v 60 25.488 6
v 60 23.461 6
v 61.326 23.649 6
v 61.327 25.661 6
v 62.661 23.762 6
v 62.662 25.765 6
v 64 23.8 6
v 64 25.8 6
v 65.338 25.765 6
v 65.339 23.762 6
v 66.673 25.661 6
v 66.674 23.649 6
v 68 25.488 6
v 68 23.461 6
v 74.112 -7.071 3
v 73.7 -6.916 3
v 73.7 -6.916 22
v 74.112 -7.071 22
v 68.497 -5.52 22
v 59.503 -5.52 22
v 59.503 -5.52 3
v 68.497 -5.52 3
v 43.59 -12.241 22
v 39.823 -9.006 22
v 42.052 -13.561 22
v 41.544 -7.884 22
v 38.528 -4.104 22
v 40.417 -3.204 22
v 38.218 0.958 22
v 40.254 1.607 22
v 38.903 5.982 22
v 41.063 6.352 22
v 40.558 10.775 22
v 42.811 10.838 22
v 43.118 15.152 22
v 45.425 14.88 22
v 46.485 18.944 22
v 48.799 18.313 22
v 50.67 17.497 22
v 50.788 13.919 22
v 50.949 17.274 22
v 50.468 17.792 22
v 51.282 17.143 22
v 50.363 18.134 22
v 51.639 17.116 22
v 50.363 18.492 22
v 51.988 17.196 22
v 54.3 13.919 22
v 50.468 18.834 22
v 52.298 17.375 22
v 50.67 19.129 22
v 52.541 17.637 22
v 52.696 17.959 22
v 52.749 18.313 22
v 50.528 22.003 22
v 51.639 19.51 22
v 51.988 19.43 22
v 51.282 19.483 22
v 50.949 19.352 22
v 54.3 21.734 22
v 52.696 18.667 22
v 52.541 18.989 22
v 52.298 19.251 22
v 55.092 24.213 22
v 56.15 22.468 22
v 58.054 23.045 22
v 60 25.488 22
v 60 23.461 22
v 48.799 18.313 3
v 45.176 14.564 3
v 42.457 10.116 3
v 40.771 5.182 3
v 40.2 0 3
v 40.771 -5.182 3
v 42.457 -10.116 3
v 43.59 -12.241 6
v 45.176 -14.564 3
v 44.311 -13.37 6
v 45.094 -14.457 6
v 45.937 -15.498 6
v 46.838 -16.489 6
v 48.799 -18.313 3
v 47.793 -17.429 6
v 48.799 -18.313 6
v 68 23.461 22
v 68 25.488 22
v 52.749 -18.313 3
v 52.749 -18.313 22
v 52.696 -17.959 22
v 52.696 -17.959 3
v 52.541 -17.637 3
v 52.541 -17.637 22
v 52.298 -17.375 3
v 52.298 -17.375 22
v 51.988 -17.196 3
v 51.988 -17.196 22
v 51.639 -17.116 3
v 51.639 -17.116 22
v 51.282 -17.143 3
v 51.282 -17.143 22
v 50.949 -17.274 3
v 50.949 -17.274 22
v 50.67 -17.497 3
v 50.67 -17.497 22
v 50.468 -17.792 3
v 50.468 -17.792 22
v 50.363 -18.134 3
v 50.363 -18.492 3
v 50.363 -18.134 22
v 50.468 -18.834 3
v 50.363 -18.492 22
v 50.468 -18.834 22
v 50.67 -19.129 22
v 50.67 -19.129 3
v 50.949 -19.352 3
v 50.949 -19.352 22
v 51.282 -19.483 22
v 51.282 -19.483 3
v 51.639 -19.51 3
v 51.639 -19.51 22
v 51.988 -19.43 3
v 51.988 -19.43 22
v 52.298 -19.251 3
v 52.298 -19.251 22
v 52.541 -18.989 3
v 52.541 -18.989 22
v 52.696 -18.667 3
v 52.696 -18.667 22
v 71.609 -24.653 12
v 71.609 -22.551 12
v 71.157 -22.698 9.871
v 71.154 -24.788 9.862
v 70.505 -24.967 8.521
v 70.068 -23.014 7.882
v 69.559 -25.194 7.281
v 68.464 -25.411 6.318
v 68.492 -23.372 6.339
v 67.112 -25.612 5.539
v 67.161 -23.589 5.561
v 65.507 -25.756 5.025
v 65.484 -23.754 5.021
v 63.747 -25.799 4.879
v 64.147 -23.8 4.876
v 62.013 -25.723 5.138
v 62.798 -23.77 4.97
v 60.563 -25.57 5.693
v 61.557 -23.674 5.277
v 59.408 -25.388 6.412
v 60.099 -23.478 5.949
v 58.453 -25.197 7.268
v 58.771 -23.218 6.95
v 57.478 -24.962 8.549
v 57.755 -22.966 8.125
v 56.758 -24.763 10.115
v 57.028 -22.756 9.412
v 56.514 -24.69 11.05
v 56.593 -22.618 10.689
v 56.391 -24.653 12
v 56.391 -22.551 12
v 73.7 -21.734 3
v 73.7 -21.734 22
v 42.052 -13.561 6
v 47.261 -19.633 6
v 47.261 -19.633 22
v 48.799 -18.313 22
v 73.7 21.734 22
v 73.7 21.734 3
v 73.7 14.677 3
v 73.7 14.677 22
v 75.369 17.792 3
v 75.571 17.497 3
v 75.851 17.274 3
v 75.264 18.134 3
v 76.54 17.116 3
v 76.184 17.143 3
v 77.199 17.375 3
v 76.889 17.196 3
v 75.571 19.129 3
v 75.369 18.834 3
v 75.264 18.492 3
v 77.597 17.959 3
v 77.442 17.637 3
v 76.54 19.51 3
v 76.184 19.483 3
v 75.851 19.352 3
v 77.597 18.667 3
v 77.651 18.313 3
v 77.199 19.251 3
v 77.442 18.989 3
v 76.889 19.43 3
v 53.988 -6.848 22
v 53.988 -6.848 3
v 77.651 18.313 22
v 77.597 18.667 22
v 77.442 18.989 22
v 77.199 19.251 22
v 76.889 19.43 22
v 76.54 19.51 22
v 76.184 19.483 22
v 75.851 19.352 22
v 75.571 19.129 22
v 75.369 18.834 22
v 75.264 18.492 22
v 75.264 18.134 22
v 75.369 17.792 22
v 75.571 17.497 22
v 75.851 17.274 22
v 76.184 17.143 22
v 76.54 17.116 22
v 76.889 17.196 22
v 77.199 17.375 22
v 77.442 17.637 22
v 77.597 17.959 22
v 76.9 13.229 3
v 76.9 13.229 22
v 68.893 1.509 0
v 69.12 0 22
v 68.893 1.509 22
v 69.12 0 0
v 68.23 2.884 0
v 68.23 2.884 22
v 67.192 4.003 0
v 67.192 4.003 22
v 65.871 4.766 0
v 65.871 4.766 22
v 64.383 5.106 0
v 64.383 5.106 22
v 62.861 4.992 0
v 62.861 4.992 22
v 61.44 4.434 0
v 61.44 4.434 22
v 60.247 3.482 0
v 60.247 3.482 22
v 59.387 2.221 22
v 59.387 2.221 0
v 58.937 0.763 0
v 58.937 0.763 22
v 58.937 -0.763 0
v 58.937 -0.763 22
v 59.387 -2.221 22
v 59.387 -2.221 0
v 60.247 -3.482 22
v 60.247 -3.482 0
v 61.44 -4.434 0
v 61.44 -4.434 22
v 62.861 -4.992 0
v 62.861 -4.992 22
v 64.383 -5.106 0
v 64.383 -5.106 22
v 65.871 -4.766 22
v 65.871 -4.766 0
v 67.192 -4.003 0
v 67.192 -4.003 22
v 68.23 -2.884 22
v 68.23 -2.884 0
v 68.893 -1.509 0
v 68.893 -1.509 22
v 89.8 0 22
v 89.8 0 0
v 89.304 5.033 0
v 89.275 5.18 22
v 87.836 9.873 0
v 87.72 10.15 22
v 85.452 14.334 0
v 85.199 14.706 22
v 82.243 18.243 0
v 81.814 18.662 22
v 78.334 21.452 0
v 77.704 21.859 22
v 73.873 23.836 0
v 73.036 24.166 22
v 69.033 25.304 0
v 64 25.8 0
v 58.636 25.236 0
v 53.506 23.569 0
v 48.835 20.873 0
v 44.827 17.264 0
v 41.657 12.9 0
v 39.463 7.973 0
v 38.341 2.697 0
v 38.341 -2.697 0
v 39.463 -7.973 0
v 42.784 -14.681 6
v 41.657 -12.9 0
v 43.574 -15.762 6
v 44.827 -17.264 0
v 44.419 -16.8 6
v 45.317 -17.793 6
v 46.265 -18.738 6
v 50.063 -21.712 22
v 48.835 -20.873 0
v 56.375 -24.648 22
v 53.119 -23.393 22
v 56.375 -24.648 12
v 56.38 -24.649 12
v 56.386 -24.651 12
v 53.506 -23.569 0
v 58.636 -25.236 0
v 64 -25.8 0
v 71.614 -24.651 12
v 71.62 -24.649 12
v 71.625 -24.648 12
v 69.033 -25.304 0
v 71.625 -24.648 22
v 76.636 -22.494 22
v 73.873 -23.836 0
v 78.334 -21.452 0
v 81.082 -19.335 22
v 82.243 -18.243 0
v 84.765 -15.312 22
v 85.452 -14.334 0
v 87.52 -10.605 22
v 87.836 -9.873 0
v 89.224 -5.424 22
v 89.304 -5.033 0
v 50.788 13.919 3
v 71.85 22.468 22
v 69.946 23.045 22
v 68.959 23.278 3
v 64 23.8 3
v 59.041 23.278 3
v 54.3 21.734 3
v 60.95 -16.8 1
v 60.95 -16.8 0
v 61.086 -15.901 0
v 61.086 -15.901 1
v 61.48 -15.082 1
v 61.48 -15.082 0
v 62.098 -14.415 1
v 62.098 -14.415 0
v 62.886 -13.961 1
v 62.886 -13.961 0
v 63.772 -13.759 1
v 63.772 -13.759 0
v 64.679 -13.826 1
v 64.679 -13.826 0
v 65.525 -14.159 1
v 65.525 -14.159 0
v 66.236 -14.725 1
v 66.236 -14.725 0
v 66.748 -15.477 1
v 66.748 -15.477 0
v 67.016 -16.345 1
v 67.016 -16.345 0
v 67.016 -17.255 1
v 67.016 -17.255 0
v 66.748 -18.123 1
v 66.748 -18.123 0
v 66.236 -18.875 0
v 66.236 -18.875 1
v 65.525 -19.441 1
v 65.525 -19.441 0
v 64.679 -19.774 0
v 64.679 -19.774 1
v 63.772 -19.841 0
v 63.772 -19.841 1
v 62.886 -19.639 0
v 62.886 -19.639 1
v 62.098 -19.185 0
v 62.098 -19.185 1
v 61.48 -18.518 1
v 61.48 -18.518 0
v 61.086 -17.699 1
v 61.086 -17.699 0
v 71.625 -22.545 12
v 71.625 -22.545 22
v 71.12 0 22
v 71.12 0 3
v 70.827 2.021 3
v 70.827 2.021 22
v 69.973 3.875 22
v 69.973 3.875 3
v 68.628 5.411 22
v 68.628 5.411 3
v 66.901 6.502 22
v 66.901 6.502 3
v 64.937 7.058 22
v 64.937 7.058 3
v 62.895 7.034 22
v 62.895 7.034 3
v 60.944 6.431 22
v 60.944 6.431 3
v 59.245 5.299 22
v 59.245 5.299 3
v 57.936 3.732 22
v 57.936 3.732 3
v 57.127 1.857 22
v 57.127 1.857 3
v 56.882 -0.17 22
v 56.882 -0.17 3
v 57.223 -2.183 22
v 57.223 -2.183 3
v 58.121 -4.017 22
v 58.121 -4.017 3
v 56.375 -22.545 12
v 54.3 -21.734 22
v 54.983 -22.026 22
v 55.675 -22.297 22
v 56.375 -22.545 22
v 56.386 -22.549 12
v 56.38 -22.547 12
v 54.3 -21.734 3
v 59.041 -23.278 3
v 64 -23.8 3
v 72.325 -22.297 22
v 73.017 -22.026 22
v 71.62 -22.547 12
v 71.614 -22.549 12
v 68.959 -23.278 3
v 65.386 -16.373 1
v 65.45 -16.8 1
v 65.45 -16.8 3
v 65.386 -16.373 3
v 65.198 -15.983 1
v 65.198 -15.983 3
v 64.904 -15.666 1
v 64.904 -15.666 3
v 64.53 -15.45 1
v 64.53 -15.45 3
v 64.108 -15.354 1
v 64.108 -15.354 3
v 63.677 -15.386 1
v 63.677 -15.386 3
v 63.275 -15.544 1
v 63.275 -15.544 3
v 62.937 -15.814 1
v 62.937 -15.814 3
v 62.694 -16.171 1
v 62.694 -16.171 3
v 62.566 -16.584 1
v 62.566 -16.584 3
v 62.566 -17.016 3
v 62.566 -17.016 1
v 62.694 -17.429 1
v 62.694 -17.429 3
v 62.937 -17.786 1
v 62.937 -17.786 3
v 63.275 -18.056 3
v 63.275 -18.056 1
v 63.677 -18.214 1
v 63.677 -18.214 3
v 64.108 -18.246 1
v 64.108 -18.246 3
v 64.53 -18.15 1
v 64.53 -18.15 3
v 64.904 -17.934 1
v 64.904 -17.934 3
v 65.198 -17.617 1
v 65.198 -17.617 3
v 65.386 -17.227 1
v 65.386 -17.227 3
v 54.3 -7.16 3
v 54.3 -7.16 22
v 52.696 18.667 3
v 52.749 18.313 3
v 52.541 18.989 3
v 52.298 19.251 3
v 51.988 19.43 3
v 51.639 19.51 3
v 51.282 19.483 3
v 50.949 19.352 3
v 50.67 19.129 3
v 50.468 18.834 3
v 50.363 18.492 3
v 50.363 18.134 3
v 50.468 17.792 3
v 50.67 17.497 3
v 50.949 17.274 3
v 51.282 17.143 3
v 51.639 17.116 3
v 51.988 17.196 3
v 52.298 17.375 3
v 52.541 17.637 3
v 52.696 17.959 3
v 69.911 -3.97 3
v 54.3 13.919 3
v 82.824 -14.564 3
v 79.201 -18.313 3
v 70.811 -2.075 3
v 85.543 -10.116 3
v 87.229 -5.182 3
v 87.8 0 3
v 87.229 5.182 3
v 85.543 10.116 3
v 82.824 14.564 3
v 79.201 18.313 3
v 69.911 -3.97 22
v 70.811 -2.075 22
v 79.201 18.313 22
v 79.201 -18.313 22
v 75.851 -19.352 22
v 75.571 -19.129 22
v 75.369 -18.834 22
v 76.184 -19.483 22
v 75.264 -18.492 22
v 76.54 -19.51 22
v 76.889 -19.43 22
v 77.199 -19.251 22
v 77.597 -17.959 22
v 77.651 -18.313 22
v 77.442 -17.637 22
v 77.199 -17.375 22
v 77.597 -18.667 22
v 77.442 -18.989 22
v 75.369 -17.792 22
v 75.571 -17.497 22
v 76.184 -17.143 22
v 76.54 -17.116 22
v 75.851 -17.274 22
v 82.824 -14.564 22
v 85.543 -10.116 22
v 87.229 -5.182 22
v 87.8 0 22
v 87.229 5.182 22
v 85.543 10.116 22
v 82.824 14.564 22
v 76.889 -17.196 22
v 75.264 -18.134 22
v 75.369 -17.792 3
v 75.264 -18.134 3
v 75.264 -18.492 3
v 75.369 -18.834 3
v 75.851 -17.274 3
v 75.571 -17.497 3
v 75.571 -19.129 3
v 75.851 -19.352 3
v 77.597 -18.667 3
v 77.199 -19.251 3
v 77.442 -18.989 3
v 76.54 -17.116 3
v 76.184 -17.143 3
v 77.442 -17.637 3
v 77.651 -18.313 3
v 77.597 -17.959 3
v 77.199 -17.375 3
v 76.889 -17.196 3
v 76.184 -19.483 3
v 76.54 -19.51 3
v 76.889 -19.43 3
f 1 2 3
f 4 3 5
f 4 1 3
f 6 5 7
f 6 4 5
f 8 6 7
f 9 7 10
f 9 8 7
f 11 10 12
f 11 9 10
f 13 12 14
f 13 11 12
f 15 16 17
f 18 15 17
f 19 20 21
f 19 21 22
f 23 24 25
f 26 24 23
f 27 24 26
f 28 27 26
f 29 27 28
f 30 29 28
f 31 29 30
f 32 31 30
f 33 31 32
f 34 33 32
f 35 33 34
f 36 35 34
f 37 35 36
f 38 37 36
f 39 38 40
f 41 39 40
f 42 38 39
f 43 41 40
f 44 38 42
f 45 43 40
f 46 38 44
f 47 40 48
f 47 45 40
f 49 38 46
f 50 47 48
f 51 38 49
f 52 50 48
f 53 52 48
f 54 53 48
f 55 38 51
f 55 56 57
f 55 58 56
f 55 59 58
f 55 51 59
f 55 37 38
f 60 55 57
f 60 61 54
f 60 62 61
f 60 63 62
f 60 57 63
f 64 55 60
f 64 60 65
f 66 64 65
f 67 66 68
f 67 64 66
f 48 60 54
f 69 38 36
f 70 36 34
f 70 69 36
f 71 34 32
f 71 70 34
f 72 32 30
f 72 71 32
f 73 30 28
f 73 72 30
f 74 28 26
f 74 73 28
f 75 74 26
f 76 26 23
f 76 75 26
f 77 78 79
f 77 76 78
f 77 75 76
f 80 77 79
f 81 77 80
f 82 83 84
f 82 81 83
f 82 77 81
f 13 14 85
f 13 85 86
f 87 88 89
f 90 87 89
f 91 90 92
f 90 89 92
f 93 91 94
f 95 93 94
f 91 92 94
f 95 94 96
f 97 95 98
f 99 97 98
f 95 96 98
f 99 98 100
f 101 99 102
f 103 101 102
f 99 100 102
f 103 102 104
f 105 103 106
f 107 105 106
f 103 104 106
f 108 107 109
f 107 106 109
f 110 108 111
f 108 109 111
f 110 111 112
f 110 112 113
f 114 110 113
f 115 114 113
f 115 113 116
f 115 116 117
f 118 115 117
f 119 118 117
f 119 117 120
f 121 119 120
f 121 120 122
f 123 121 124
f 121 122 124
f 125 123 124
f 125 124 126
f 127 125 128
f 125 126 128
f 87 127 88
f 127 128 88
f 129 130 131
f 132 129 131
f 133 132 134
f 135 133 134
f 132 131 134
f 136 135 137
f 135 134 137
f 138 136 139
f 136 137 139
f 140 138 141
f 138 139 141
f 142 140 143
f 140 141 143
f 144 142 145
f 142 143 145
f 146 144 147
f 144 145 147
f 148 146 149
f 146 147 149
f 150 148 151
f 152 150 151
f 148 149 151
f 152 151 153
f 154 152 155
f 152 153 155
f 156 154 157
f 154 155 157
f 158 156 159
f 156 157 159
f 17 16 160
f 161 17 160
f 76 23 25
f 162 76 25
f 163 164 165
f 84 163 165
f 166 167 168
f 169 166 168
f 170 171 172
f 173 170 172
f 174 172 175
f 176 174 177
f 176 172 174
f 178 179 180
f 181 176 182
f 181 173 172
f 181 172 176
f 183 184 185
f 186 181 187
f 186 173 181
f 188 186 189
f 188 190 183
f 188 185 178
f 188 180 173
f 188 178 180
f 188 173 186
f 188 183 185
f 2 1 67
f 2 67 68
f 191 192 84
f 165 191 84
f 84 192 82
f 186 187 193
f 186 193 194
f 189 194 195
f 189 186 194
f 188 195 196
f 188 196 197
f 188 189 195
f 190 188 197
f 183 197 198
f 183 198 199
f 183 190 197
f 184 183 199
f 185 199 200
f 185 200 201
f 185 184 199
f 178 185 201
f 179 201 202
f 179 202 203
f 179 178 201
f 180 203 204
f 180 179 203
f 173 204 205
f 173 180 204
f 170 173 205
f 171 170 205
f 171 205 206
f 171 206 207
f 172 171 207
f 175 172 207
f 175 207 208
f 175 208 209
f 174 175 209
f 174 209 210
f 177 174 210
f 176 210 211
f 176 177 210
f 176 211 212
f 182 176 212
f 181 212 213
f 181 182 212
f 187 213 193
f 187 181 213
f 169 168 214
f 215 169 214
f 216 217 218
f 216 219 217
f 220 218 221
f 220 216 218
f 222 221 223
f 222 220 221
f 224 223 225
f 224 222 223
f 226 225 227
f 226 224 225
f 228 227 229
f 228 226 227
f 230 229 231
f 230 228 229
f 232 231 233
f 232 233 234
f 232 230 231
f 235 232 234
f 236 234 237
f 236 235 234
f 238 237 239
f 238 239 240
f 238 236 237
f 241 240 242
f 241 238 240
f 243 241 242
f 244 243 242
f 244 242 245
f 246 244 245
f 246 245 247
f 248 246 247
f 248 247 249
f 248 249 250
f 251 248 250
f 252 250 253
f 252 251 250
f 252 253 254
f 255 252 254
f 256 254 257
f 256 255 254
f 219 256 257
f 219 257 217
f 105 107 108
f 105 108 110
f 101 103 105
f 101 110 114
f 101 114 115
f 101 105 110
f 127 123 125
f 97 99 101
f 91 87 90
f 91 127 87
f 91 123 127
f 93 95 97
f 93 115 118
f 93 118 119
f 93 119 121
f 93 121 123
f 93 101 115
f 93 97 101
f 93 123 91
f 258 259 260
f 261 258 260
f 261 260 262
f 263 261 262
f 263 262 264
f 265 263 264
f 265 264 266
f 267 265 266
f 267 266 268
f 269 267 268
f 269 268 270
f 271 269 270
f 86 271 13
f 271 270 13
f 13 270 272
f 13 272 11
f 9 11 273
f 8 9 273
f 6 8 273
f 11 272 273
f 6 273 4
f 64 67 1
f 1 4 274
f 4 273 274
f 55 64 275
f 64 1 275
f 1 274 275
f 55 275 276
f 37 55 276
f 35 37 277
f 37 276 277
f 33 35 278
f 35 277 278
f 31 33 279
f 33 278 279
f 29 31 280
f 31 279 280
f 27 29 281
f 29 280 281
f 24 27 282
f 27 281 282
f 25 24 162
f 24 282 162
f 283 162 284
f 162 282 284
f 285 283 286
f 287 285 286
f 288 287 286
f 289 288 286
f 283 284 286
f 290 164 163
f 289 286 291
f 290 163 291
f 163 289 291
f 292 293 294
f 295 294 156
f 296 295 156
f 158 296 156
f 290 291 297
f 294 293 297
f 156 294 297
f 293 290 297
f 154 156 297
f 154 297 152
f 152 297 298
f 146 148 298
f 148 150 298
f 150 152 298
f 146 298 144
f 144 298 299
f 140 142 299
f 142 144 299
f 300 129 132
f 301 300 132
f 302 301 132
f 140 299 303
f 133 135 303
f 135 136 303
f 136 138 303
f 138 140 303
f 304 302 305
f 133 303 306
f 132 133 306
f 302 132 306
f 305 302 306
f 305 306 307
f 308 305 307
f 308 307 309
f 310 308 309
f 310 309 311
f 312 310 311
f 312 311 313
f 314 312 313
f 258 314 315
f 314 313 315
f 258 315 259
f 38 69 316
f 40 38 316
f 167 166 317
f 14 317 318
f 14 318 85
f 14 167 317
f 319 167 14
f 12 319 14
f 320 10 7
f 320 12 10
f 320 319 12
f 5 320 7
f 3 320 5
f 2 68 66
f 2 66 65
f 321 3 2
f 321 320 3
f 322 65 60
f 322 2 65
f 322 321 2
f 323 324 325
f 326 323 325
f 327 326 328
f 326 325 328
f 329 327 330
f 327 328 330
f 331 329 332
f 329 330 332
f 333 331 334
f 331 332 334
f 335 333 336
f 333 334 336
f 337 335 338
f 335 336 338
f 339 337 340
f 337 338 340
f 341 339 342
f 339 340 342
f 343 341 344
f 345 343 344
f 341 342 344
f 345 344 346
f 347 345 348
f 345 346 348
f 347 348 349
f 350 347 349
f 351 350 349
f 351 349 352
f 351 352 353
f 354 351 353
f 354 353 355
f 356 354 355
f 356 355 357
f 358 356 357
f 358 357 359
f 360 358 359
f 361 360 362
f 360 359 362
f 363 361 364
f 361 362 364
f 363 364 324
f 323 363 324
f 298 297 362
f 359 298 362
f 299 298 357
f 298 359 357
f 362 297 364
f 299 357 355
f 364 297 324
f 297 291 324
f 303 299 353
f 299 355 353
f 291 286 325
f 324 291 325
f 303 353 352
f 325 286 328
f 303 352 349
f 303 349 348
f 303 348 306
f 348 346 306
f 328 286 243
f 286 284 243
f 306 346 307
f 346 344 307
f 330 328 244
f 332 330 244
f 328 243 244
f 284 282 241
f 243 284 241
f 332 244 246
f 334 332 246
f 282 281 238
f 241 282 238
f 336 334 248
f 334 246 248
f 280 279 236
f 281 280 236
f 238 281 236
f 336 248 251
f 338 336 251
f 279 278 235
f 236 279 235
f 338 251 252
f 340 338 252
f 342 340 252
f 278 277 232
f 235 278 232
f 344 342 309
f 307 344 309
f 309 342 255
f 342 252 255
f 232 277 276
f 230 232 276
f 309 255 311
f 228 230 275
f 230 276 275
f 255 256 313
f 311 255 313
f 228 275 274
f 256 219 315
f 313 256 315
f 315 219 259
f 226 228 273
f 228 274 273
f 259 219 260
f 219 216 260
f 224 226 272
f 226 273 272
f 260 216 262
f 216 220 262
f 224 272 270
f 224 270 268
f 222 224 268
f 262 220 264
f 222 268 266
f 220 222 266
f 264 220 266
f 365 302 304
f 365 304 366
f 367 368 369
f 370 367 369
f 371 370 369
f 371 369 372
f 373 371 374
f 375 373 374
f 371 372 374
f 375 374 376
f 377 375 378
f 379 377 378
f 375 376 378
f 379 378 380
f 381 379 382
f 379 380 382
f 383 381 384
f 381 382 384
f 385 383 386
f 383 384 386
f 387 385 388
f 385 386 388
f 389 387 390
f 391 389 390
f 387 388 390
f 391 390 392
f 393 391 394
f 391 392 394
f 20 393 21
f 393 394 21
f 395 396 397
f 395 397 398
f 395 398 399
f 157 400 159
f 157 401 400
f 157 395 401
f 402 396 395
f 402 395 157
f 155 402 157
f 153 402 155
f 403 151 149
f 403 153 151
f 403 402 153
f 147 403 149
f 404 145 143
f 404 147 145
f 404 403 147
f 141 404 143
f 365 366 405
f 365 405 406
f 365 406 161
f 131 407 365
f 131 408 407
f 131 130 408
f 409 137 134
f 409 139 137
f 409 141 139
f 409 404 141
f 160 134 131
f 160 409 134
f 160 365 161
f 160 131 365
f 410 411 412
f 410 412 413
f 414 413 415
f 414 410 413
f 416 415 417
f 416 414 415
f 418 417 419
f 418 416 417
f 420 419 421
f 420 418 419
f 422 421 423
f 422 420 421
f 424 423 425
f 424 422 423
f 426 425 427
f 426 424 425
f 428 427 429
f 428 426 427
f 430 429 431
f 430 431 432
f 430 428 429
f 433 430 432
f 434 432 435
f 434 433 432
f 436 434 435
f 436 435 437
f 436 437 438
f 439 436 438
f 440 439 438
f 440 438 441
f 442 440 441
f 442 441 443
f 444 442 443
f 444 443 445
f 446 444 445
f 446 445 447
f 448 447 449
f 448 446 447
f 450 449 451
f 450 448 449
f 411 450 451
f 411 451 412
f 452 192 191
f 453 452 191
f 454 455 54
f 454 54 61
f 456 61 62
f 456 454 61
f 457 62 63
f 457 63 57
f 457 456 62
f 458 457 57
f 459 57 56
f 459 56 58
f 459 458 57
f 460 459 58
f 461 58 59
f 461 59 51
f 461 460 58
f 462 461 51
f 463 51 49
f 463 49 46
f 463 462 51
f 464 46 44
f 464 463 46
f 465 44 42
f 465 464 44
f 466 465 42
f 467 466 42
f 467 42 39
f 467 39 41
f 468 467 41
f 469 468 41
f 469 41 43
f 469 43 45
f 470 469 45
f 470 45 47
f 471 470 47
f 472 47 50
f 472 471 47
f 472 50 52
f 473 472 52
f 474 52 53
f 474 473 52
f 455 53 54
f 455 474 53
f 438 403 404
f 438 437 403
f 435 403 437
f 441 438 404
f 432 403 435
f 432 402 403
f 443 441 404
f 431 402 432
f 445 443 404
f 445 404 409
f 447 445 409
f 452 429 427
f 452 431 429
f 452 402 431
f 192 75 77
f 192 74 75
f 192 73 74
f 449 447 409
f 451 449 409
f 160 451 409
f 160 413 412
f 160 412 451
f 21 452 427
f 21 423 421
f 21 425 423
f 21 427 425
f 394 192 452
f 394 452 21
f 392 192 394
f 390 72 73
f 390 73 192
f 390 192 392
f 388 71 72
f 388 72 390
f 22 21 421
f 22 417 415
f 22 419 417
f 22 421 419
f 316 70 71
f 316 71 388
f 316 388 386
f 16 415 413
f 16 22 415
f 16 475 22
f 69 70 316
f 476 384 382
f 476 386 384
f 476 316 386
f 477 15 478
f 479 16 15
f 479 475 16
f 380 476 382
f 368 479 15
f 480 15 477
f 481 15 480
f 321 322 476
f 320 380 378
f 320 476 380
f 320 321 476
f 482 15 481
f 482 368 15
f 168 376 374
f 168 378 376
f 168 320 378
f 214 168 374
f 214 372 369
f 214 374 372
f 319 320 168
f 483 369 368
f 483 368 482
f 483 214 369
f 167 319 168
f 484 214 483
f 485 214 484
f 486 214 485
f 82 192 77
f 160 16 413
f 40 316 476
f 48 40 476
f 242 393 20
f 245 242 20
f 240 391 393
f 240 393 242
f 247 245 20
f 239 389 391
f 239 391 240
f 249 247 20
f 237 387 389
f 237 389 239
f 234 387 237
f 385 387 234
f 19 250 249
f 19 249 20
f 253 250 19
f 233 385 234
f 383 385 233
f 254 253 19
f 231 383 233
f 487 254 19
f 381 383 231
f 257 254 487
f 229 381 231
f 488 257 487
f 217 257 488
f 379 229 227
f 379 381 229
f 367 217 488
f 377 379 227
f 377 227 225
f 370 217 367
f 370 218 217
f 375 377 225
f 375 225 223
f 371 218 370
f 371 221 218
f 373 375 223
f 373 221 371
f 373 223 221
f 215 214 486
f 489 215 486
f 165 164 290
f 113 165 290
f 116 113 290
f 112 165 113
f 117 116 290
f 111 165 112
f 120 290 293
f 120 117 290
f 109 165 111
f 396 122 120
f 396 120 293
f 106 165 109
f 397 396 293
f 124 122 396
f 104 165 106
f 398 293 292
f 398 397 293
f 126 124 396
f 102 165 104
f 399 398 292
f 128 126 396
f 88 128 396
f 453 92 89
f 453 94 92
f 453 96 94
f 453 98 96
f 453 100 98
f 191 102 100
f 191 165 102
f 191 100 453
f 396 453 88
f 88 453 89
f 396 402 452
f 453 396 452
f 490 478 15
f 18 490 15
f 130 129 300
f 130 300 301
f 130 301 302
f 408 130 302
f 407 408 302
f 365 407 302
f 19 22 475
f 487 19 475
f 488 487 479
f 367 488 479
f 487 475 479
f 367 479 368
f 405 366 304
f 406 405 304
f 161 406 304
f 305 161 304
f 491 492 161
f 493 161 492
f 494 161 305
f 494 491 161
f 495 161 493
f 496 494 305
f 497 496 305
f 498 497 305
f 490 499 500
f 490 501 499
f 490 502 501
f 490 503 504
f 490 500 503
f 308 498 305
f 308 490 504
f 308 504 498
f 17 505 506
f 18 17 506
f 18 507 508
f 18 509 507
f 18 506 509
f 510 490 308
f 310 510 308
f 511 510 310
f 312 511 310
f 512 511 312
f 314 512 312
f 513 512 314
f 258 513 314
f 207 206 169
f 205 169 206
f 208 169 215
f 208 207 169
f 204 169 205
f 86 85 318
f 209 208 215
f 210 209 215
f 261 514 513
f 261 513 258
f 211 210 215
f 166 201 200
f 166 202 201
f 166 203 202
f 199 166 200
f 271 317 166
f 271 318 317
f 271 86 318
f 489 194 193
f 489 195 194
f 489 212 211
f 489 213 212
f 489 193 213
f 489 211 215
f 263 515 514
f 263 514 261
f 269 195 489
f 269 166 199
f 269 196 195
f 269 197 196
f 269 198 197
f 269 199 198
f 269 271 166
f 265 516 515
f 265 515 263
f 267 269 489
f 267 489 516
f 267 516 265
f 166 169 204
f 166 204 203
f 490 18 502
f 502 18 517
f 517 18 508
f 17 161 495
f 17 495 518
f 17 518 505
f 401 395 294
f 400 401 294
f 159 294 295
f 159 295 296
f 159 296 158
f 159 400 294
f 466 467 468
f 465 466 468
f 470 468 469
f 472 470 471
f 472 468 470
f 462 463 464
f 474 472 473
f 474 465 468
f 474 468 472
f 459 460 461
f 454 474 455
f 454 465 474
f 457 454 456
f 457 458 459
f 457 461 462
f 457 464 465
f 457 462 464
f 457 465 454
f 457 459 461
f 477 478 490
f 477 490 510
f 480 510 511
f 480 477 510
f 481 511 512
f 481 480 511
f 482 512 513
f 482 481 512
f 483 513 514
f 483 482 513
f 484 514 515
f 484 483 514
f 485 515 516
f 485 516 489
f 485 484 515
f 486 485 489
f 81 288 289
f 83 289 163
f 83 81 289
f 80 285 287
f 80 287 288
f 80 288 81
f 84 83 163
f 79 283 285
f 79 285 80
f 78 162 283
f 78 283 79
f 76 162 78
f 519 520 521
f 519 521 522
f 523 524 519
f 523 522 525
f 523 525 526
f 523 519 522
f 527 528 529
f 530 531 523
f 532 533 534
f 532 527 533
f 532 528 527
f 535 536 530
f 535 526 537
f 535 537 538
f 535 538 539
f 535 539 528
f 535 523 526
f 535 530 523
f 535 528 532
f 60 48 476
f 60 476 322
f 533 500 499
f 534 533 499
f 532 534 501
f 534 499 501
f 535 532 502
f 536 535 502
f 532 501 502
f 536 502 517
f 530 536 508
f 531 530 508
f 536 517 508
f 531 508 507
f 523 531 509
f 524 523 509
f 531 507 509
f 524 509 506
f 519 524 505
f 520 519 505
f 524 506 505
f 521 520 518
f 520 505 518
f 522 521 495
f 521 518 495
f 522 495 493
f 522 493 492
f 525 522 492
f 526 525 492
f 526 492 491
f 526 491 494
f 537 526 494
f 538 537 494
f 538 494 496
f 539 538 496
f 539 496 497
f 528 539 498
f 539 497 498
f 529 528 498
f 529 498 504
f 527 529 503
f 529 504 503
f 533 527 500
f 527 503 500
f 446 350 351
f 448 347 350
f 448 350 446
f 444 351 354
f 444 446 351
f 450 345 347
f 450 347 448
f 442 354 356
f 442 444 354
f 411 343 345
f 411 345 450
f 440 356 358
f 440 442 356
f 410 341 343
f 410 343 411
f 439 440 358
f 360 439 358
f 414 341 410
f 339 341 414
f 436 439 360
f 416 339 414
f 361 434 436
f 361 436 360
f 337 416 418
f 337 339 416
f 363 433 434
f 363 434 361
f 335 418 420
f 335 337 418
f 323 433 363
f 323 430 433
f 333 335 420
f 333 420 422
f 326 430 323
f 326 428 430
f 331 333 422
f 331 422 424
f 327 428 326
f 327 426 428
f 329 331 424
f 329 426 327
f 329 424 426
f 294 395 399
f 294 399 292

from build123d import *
from OCP.BRepFilletAPI import BRepFilletAPI_MakeChamfer

# Parameters (mm, degrees)
SKETCH_1_R               = 5
EXTRUDE_1_DEPTH          = 2
EXTRUDE_2_DEPTH          = 20
EXTRUDE_2_DEPTH_BACK     = 2
SKETCH_2_R               = 25.8
SKETCH_2_R_2             = 23.8
SKETCH_3_R               = 1.45
CUT_EXTRUDE_2_DEPTH      = 2
SKETCH_4_R               = 23.8
SKETCH_4_R_2             = 1.45
EXTRUDE_3_DEPTH          = 1
SKETCH_5_R               = 3.05
SKETCH_5_R_2             = 1.45
CUT_EXTRUDE_3_DEPTH      = 1
CUT_EXTRUDE_5_REACH      = 62.647
CUT_EXTRUDE_5_END_RADIUS = 25.8
SKETCH_6_R               = 7.625
CUT_EXTRUDE_START        = -16
CUT_EXTRUDE_6_DEPTH      = 16
EXTRUDE_5_DEPTH          = 19
CHAMFER_1_SIZE           = 1
CHAMFER_1_SIZE2          = 0.755634891
SKETCH_9_R               = 5.12
EXTRUDE_6_DEPTH          = 19
EXTRUDE_START            = -19
SKETCH_11_R              = 1.2
EXTRUDE_7_DEPTH          = 19
CHAMFER_3_SIZE           = 7.761762605
CHAMFER_3_SIZE_2         = 10
SKETCH_13_R              = 1.2
CUT_EXTRUDE_7_DEPTH      = 19
CUT_EXTRUDE_START_2      = -10
CUT_EXTRUDE_8_DEPTH      = 10
SKETCH_15_R              = 5.12
CUT_EXTRUDE_9_DEPTH      = 10


with BuildPart() as part:
    # 草图1 → 凸台-拉伸1 (new body)
    with BuildSketch(Plane.XY):
        with BuildLine():
            ThreePointArc((64, 25.8), (38.2, 0), (64, -25.8))
            ThreePointArc((64, -25.8), (82.243354955, -18.243354955), (89.8, 0))
            ThreePointArc((89.8, 0), (82.243354955, 18.243354955), (64, 25.8))
        make_face()
        with Locations((64, 0)):
            Circle(SKETCH_1_R, mode=Mode.SUBTRACT)
    extrude(amount=EXTRUDE_1_DEPTH)

    # 草图2 → 凸台-拉伸2 (add, two sides: drawn at the far end of the back side and taken through both)
    with BuildSketch(Plane.XY.offset(2).offset(-EXTRUDE_2_DEPTH_BACK)):
        with Locations((64, 0)):
            Circle(SKETCH_2_R)
        with Locations((64, 0)):
            Circle(SKETCH_2_R_2, mode=Mode.SUBTRACT)
    extrude(amount=EXTRUDE_2_DEPTH + EXTRUDE_2_DEPTH_BACK)

    # 草图3 → 切除-拉伸2 (cut)
    with BuildSketch(Plane.XY.offset(2)):
        with Locations((64, -16.8)):
            Circle(SKETCH_3_R)
    extrude(amount=-CUT_EXTRUDE_2_DEPTH, mode=Mode.SUBTRACT)

    # 草图4 → 凸台-拉伸3 (add)
    with BuildSketch(Plane.XY.offset(2)):
        with Locations((64, 0)):
            Circle(SKETCH_4_R)
        with Locations((64, -16.8)):
            Circle(SKETCH_4_R_2, mode=Mode.SUBTRACT)
    extrude(amount=EXTRUDE_3_DEPTH)

    # 草图5 → 切除-拉伸3 (cut)
    with BuildSketch(Plane(origin=(0, 0, 0), x_dir=(-1, 0, 0), z_dir=(0, 0, -1))):
        with Locations((-64, -16.8)):
            Circle(SKETCH_5_R)
        with Locations(Location((-64, -16.8, 0), (0, 0, 180))):
            Circle(SKETCH_5_R_2, mode=Mode.SUBTRACT)
    extrude(amount=-CUT_EXTRUDE_3_DEPTH, mode=Mode.SUBTRACT)

    # 切除-拉伸5: up to this cylinder (the profile starts inside it)
    cut_extrude_5_end = Plane(origin=(64, 0, 12.5), z_dir=(0, 0, -1)) * Cylinder(CUT_EXTRUDE_5_END_RADIUS, 177.894, mode=Mode.PRIVATE)
    # 草图6 → 切除-拉伸5 (cut, up to the surface)
    with BuildSketch(Plane(origin=(74.5, -5.45, -15.2), x_dir=(0, 0, -1), z_dir=(0, 1, 0)), mode=Mode.PRIVATE) as cut_extrude_5_sk1:
        with Locations(Location((-27.7, 10.5, 0), (0, 0, 90))):
            Circle(SKETCH_6_R)
    cut_extrude_5_tool1 = extrude(cut_extrude_5_sk1.sketch, amount=-CUT_EXTRUDE_5_REACH, mode=Mode.PRIVATE) & cut_extrude_5_end
    add(cut_extrude_5_tool1.solids().sort_by_distance((64, -5.45, 12.5))[0], mode=Mode.SUBTRACT)

    # 草图7 → 切除-拉伸6 (cut)
    with BuildSketch(Plane.XY.offset(22).offset(CUT_EXTRUDE_START)):
        with BuildLine():
            ThreePointArc((48.798857294, -18.312980654), (47.30860295, -16.965767431), (45.937273528, -15.497674419))
            Line((45.937273528, -15.497674419), (44.419397354, -16.8))
            ThreePointArc((44.419397354, -16.8), (45.784957677, -18.271623715), (47.260809567, -19.632613266))
            Line((47.260809567, -19.632613266), (48.798857294, -18.312980654))
        make_face()
        with BuildLine():
            Line((44.419397354, -16.8), (45.937273528, -15.497674419))
            ThreePointArc((45.937273528, -15.497674419), (44.694639643, -13.919161667), (43.589554969, -12.241475957))
            Line((43.589554969, -12.241475957), (42.051507242, -13.561108569))
            ThreePointArc((42.051507242, -13.561108569), (43.172397024, -15.22665276), (44.419397354, -16.8))
        make_face()
        with BuildLine():
            Line((64, 25.8), (64, 23.8))
            ThreePointArc((64, 23.8), (66.007150396, 23.715213414), (68, 23.461457755))
            Line((68, 23.461457755), (68, 25.488036409))
            ThreePointArc((68, 25.488036409), (66.006073359, 25.721890865), (64, 25.8))
        make_face()
        with BuildLine():
            ThreePointArc((60, 23.461457755), (61.992849604, 23.715213414), (64, 23.8))
            Line((64, 23.8), (64, 25.8))
            ThreePointArc((64, 25.8), (61.993926641, 25.721890865), (60, 25.488036409))
            Line((60, 25.488036409), (60, 23.461457755))
        make_face()
    extrude(amount=CUT_EXTRUDE_6_DEPTH, mode=Mode.SUBTRACT)

    # 草图8 → 凸台-拉伸5 (add)
    with BuildSketch(Plane.XY.offset(3)):
        with BuildLine():
            Line((73.7, -20.16), (73.7, -21.733614518))
            ThreePointArc((73.7, -21.733614518), (76.567494222, -20.211335655), (79.201142706, -18.312980654))
            Line((79.201142706, -18.312980654), (73.7, -6.16))
            Line((73.7, -6.16), (73.7, -20.16))
        make_face()
        with BuildLine():
            Line((54.3, -20.16), (54.3, -6.16))
            Line((54.3, -6.16), (48.798857294, -18.312980654))
            ThreePointArc((48.798857294, -18.312980654), (51.432505778, -20.211335655), (54.3, -21.733614518))
            Line((54.3, -21.733614518), (54.3, -20.16))
        make_face()
    extrude(amount=EXTRUDE_5_DEPTH)

    # 倒角1: one chamfer whose edges measure the first distance from different faces: ONE call of the kernel's chamfer builder (chamfer() names one face for all edges)
    chamfer_1_edges_1 = [part.edges().sort_by_distance(p)[0] for p in [
        (73.7, -6.16, 12.5),
    ]]
    chamfer_1_side_1 = [part.faces().sort_by_distance(p)[0] for p in [
        (76.450571353, -12.236490327, 12.5),
    ]]
    chamfer_1_edges_2 = [part.edges().sort_by_distance(p)[0] for p in [
        (54.3, -6.16, 12.5),
    ]]
    chamfer_1_side_2 = [part.faces().sort_by_distance(p)[0] for p in [
        (54.3, -13.946807259, 12.5),
    ]]
    chamfer_1 = BRepFilletAPI_MakeChamfer(part.part.solid().wrapped)
    for e in chamfer_1_edges_1:
        chamfer_1.Add(CHAMFER_1_SIZE, CHAMFER_1_SIZE2, e.wrapped, chamfer_1_side_1[0].wrapped)  # the first distance lies on this face
    for e in chamfer_1_edges_2:
        chamfer_1.Add(CHAMFER_1_SIZE, CHAMFER_1_SIZE2, e.wrapped, chamfer_1_side_2[0].wrapped)  # the first distance lies on this face
    add(Compound.cast(chamfer_1.Shape()), mode=Mode.REPLACE)

    # 草图9 → 凸台-拉伸6 (add)
    with BuildSketch(Plane.XY.offset(3)):
        with BuildLine():
            ThreePointArc((71.12, 0), (60.944269687, 6.430934011), (59.502889817, -5.52))
            Line((59.502889817, -5.52), (64, -5.52))
            Line((64, -5.52), (68.497110183, -5.52))
            ThreePointArc((68.497110183, -5.52), (70.430934011, -3.055730313), (71.12, 0))
        make_face()
        with Locations((64, 0)):
            Circle(SKETCH_9_R, mode=Mode.SUBTRACT)
    extrude(amount=EXTRUDE_6_DEPTH)

    # 草图11 → 凸台-拉伸7 (add)
    # profile 1 of 2: a face of its own
    with BuildSketch(Plane.XY.offset(22).offset(EXTRUDE_START)):
        with BuildLine():
            Line((74.1123773, 7.071013151), (79.201142706, 18.312980654))
            ThreePointArc((79.201142706, 18.312980654), (76.567494222, 20.211335655), (73.7, 21.733614518))
            Line((73.7, 21.733614518), (73.7, 6.915634891))
            Line((73.7, 6.915634891), (74.1123773, 7.071013151))
        make_face()
        with Locations((76.450571353, 18.312980654)):
            Circle(SKETCH_11_R, mode=Mode.SUBTRACT)
    # profile 2 of 2: a face of its own
    with BuildSketch(Plane.XY.offset(22).offset(EXTRUDE_START)):
        with BuildLine():
            ThreePointArc((54.3, 21.733614518), (51.432505778, 20.211335655), (48.798857294, 18.312980654))
            Line((48.798857294, 18.312980654), (53.988393324, 6.848393324))
            Line((53.988393324, 6.848393324), (54.3, 7.16))
            Line((54.3, 7.16), (54.3, 21.733614518))
        make_face()
        with Locations((51.549428647, 18.312980654)):
            Circle(SKETCH_11_R, mode=Mode.SUBTRACT)
    extrude(amount=EXTRUDE_7_DEPTH)

    # 倒角3
    # the kernel refuses this chamfer: 10, 7.761762605 mm, written as the material it takes off along each edge
    with BuildSketch(Plane(origin=(53.988393324, 6.848393324, 3), x_dir=(-0.45377895497770065, 0.8911142799996788, 0), z_dir=(0, 0, 1)), Plane(origin=(73.7, 6.915634891, 3), x_dir=(-0.045923294763777815, 0.9989449689537653, 0), z_dir=(0, 0, 1))) as chamfer_3_piece_1:
        Polygon((CHAMFER_3_SIZE * 0.998944968965, -CHAMFER_3_SIZE * 0.0459232947643), (CHAMFER_3_SIZE_2 * 0.309242773975, -CHAMFER_3_SIZE_2 * 0.950983126424), (0, 0), align=None)
    extrude(amount=44.71682988, mode=Mode.SUBTRACT)

    # 草图13 → 切除-拉伸7 (cut)
    with BuildSketch(Plane.XY.offset(22)):
        with Locations((76.450571353, -18.312980654)):
            Circle(SKETCH_13_R)
        with Locations((51.549428647, -18.312980654)):
            Circle(SKETCH_13_R)
    extrude(amount=-CUT_EXTRUDE_7_DEPTH, mode=Mode.SUBTRACT)

    # 草图14 → 切除-拉伸8 (cut)
    with BuildSketch(Plane.XY.offset(22).offset(CUT_EXTRUDE_START_2)):
        with BuildLine():
            Line((56.375, -22.54549567), (56.375, -24.647502409))
            ThreePointArc((56.375, -24.647502409), (64, -25.8), (71.625, -24.647502409))
            Line((71.625, -24.647502409), (71.625, -22.54549567))
            ThreePointArc((71.625, -22.54549567), (64, -23.8), (56.375, -22.54549567))
        make_face()
    extrude(amount=CUT_EXTRUDE_8_DEPTH, mode=Mode.SUBTRACT)

    # 草图15 → 切除-拉伸9 (cut)
    with BuildSketch(Plane.XY.offset(3).offset(CUT_EXTRUDE_START_2)):
        with Locations((64, 0)):
            Circle(SKETCH_15_R)
    extrude(amount=CUT_EXTRUDE_9_DEPTH, mode=Mode.SUBTRACT)


solid = part.part
